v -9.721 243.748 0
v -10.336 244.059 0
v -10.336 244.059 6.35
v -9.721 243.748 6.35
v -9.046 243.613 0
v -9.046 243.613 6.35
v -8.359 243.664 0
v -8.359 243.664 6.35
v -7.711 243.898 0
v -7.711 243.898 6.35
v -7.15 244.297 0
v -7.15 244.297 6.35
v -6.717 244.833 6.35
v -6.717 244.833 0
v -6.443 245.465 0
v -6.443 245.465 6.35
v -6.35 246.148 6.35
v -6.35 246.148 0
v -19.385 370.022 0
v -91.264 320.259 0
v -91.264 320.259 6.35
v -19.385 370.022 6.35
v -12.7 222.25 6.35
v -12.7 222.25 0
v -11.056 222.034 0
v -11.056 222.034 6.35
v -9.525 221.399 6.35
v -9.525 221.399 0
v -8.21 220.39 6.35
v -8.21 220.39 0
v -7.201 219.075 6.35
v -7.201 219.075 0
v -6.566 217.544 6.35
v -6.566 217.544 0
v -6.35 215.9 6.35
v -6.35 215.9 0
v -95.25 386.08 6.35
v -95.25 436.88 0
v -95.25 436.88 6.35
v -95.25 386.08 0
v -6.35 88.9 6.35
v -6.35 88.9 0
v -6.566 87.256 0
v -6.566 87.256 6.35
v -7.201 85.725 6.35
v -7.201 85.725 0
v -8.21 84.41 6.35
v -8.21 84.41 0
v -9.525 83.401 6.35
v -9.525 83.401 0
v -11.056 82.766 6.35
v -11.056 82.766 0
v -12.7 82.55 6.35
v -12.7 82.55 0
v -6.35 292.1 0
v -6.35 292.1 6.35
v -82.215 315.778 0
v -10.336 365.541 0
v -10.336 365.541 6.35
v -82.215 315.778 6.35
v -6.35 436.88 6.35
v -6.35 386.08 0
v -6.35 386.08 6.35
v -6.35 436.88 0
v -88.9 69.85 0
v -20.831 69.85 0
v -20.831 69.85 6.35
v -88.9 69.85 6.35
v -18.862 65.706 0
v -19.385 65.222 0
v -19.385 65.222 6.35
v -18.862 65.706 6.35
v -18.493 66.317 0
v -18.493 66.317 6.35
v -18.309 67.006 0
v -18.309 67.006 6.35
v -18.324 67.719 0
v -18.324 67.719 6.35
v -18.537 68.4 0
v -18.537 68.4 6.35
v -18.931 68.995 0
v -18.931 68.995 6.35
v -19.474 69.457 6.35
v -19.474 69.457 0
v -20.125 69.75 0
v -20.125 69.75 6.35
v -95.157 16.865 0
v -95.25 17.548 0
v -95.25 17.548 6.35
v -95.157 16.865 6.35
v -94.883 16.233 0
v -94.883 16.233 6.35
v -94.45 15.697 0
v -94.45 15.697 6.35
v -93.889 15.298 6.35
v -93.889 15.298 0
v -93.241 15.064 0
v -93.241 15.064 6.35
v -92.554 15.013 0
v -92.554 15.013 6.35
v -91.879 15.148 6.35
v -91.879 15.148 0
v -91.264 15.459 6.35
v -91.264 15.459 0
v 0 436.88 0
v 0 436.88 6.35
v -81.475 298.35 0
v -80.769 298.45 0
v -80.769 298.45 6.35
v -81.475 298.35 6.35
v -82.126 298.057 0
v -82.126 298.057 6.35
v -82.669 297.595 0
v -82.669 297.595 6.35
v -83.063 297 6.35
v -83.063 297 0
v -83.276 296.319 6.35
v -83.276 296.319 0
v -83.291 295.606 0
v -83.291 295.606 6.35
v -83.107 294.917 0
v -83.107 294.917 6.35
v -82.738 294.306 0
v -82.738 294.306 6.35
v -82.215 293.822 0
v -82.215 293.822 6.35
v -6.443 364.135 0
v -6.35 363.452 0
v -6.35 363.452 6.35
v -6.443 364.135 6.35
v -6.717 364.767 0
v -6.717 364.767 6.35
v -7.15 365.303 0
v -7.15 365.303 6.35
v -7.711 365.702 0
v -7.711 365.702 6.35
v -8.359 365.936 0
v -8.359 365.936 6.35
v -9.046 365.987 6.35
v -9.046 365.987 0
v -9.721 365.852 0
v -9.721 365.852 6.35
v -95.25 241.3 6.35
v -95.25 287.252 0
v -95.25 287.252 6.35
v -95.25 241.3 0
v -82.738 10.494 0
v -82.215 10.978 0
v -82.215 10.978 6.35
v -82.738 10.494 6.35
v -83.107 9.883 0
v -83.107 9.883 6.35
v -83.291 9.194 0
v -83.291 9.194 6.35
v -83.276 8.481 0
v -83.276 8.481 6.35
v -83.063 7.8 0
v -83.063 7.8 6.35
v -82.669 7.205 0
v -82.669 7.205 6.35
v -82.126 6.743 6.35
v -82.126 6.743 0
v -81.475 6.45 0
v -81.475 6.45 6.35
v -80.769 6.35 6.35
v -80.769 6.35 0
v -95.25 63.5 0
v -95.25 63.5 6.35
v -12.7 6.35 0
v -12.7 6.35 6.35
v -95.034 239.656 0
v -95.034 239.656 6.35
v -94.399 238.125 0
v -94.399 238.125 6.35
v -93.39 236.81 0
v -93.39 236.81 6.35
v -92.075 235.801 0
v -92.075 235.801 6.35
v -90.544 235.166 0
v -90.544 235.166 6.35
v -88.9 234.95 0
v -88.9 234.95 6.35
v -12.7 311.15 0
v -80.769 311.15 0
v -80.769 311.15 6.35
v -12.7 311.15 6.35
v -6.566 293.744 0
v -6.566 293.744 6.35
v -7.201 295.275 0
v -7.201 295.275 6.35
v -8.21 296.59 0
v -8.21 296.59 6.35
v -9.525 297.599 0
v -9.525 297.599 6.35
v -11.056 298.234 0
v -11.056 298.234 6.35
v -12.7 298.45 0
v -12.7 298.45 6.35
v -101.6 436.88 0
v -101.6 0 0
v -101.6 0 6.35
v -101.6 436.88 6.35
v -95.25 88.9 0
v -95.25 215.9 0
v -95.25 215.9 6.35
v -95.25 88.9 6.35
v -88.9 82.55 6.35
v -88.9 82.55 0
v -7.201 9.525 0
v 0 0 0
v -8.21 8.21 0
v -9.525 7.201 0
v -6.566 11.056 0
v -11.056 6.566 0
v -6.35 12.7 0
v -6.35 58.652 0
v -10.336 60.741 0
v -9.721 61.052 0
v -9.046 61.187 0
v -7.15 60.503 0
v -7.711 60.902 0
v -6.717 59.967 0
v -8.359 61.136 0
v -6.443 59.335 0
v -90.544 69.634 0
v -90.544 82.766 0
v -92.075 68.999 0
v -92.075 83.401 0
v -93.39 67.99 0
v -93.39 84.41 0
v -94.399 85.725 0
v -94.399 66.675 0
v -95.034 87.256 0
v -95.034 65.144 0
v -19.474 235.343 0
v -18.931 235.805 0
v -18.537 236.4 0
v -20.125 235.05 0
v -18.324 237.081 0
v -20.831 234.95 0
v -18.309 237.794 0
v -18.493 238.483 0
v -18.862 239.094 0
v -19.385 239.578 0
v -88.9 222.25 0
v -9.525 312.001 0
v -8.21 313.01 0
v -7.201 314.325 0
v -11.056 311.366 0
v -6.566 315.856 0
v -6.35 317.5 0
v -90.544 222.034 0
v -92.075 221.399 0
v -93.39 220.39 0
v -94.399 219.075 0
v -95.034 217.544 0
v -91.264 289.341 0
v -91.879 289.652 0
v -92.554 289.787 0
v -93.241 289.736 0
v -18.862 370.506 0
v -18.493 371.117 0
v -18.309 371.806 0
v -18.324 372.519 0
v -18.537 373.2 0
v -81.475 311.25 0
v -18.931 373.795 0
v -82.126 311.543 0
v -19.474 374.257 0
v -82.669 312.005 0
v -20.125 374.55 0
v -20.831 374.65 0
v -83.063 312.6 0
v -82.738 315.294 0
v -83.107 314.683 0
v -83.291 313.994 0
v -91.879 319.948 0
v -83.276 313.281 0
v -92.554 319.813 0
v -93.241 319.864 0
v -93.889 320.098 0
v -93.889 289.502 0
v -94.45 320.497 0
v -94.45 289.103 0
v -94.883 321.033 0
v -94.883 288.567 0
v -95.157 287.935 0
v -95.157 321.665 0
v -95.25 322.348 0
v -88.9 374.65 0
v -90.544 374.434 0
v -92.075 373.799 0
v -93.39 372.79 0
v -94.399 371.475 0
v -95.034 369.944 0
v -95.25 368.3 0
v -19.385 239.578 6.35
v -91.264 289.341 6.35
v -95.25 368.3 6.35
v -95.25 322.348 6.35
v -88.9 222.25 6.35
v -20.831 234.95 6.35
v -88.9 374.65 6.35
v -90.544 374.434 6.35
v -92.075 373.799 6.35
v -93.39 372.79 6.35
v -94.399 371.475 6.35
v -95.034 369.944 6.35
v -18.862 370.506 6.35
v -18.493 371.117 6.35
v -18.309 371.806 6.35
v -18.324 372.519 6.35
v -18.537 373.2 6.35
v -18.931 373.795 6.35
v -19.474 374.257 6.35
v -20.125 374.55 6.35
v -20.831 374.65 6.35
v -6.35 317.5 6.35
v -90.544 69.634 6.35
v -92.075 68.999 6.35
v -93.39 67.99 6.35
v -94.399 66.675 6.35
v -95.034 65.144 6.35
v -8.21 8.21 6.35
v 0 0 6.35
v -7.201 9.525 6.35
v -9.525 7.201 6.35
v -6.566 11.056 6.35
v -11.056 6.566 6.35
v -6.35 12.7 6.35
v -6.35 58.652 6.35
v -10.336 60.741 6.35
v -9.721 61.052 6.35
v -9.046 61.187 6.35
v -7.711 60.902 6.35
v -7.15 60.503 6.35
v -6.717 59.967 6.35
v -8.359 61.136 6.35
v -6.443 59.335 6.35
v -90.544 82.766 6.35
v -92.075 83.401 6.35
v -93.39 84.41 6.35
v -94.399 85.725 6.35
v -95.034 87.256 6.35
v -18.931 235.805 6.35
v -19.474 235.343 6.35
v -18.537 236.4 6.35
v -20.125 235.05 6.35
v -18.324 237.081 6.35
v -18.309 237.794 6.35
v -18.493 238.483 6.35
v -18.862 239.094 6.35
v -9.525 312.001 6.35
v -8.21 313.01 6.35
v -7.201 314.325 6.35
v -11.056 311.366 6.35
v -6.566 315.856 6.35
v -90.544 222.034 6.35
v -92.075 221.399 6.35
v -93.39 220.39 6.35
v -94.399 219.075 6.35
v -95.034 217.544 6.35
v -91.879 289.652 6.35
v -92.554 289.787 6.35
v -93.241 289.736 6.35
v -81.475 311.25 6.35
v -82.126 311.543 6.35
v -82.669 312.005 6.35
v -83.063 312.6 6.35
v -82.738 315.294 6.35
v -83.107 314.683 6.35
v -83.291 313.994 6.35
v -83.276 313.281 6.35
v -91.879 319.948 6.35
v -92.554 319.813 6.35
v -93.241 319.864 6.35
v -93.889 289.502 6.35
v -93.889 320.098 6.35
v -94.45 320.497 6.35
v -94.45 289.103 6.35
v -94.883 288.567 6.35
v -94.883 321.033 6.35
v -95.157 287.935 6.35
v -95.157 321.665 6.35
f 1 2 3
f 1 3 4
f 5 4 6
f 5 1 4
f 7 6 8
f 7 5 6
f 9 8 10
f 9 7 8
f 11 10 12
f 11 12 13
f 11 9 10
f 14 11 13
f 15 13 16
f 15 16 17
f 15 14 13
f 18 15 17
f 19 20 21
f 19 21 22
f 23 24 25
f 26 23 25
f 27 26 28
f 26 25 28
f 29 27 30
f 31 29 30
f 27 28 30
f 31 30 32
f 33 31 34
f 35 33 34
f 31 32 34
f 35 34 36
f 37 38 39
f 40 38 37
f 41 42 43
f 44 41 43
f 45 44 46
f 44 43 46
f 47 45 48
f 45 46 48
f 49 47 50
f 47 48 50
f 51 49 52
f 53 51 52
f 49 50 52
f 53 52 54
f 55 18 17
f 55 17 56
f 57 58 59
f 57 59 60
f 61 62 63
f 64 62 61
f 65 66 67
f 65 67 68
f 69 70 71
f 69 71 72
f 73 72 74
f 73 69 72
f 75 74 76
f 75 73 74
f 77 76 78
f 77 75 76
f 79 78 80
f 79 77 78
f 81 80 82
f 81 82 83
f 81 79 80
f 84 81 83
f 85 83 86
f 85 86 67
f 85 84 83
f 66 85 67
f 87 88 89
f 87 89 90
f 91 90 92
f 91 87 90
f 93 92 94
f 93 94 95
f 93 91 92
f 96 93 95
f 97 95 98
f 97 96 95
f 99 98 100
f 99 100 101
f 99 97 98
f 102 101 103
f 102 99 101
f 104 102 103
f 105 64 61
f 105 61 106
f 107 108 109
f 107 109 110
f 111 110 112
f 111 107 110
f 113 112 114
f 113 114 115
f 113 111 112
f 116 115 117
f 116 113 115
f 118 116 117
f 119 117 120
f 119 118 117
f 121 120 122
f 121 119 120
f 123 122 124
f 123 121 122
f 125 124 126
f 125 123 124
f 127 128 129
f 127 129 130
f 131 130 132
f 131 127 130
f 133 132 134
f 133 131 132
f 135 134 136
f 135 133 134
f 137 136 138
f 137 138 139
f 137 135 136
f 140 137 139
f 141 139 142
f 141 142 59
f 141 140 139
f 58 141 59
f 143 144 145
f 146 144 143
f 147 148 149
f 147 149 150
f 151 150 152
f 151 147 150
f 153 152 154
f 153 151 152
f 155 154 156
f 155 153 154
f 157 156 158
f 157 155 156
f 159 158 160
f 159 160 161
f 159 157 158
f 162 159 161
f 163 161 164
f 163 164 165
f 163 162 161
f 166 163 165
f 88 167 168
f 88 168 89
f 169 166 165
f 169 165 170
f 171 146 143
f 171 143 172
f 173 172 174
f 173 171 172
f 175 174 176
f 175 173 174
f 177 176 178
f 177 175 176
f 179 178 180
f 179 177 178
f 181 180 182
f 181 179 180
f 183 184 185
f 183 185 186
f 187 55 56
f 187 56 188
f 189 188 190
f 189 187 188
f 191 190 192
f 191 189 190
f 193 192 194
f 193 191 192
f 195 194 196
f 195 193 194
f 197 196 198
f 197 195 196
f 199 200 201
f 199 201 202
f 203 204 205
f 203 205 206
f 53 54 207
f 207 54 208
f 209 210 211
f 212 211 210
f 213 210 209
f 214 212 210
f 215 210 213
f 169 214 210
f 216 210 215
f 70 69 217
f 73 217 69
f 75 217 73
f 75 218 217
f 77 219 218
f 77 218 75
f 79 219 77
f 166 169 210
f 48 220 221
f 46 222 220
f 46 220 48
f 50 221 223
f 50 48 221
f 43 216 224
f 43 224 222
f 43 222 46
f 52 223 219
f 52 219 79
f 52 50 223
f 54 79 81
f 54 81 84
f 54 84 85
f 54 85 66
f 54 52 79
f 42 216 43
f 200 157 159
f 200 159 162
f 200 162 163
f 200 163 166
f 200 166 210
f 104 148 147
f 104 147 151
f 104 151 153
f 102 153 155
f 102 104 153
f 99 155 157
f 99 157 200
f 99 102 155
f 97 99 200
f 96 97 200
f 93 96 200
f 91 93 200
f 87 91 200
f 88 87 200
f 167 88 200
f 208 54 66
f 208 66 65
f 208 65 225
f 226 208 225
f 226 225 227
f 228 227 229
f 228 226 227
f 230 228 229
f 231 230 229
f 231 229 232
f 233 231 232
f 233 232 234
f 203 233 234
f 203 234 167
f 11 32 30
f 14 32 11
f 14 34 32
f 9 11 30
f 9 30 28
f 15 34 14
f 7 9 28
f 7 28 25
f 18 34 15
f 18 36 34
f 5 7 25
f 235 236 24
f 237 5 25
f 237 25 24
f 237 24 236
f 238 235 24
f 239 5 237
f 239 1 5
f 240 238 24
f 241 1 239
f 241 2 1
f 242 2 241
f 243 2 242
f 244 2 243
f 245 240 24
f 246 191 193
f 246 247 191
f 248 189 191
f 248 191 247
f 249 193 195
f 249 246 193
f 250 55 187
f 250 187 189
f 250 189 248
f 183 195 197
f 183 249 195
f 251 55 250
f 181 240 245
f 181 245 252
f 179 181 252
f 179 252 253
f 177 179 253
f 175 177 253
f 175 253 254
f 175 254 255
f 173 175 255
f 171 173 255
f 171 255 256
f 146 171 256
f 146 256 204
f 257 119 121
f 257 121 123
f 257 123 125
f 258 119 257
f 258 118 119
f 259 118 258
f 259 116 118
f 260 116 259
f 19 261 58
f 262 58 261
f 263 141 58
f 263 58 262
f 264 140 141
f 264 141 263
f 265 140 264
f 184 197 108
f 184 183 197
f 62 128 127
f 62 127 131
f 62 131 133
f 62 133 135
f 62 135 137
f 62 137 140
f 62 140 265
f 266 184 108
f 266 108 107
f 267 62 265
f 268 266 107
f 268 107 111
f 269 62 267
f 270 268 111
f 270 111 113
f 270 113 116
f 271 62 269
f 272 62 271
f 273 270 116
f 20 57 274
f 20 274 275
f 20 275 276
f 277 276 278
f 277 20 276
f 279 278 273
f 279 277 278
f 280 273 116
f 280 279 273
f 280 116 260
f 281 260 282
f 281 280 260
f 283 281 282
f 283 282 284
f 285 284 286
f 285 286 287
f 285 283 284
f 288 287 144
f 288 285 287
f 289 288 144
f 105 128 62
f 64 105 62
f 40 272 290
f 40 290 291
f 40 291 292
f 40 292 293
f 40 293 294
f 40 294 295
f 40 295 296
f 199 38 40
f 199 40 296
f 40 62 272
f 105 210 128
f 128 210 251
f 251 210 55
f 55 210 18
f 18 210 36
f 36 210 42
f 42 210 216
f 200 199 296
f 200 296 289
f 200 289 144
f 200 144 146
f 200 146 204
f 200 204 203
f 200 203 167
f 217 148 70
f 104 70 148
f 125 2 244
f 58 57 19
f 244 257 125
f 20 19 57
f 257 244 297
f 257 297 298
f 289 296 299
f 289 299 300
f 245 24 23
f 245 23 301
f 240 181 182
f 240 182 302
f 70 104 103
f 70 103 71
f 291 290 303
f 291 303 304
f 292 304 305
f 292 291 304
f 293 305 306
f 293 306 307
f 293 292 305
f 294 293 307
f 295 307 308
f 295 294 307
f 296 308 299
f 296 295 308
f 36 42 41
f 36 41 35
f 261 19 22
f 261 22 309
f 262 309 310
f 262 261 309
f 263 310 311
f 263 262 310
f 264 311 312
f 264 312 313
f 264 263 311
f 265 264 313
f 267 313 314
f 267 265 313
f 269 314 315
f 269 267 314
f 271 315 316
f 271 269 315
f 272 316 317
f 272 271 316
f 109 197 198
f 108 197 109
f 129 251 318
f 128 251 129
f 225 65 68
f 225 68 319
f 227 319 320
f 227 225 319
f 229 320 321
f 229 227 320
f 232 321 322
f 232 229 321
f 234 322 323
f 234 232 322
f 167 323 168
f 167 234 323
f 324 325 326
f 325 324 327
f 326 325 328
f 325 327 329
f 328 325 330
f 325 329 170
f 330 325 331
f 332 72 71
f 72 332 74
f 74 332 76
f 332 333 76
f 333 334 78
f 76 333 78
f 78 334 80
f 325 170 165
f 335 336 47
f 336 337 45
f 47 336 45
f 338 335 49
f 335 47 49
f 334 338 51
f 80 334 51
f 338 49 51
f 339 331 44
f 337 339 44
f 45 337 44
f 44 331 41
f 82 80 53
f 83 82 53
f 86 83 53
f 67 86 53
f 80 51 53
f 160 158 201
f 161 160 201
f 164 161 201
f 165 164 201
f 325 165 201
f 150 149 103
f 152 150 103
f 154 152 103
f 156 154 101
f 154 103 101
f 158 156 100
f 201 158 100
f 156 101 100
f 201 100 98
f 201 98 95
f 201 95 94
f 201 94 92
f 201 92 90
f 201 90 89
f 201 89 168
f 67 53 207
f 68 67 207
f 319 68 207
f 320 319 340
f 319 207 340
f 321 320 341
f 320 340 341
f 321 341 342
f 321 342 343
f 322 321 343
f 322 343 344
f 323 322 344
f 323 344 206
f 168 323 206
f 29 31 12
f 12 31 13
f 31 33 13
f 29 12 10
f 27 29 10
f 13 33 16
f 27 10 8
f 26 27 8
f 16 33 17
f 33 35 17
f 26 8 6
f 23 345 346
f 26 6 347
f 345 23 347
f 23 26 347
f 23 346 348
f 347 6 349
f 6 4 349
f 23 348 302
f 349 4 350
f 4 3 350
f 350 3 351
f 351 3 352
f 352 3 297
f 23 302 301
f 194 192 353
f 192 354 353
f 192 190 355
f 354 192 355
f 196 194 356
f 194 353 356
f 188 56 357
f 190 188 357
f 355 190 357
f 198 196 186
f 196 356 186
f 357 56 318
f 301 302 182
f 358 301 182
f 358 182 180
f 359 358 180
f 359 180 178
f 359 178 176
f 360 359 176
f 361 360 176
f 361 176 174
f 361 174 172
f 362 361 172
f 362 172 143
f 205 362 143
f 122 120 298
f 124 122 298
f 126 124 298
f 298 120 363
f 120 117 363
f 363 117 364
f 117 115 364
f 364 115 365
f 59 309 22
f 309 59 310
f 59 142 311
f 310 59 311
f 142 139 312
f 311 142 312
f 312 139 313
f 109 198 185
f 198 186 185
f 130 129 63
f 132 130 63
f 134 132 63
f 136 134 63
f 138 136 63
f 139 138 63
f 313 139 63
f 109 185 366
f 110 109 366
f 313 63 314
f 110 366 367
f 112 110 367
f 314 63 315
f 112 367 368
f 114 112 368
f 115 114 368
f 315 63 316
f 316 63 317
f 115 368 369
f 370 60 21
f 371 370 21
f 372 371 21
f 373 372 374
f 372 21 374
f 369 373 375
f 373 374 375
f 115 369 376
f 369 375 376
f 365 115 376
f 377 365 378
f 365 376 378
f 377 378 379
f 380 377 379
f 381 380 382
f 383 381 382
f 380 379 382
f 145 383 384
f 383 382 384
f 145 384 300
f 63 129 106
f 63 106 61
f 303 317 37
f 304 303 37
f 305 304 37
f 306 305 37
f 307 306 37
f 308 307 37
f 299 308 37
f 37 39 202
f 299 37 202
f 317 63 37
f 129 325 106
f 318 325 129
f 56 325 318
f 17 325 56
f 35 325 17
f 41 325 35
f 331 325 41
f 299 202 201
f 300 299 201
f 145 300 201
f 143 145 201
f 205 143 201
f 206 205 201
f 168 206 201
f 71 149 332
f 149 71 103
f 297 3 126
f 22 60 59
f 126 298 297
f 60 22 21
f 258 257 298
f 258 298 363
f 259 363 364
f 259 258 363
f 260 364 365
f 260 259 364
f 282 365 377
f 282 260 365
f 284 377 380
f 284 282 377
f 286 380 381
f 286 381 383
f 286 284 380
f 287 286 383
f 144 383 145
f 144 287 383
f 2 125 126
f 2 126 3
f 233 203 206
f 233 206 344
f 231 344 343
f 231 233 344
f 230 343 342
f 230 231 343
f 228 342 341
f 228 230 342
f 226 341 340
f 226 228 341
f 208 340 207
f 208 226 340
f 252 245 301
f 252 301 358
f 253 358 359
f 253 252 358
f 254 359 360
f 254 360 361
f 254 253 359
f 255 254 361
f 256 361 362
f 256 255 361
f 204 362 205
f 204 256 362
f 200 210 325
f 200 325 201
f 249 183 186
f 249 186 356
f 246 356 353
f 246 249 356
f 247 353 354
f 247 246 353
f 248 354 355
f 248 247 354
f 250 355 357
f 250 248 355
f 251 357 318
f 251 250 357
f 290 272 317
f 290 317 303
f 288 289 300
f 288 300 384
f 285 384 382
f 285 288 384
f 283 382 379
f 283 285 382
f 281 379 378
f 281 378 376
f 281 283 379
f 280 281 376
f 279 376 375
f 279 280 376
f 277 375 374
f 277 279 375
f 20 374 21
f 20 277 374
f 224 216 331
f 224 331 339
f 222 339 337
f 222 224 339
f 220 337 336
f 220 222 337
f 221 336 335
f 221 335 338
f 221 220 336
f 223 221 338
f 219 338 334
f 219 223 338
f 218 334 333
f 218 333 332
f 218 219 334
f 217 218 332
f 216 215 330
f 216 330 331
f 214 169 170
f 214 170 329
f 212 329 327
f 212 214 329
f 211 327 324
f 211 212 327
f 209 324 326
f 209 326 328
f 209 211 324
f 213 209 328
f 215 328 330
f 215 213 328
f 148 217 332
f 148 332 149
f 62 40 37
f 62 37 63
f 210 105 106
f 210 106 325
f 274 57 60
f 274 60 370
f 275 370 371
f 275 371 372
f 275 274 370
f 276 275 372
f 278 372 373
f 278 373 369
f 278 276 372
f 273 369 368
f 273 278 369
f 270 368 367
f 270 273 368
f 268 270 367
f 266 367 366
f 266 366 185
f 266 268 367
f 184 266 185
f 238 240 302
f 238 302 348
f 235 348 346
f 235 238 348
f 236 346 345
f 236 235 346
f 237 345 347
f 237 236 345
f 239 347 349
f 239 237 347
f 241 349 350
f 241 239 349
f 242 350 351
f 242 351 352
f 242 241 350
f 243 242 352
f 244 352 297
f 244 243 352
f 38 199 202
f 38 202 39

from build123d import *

# Parameters (mm, degrees)
BOSS_EXTRUDE1_DEPTH = 6.35
CUT_EXTRUDE1_START  = -6.35
CUT_EXTRUDE1_DEPTH  = 6.35


with BuildPart() as part:
    # Model → Boss-Extrude1 (new body)
    with BuildSketch(Plane.XY):
        Polygon((-95.25, 386.08), (-6.35, 386.08), (-6.35, 436.88), (0, 436.88), (0, 0), (-101.6, 0), (-101.6, 436.88), (-95.25, 436.88), align=None)
        with BuildLine():
            Line((-80.76878597, 311.15), (-12.7, 311.15))
            ThreePointArc((-12.7, 311.15), (-8.209871939, 313.009871939), (-6.35, 317.5))
            Line((-6.35, 317.5), (-6.35, 363.45223644))
            ThreePointArc((-6.35, 363.45223644), (-7.711169032, 365.702115893), (-10.335793346, 365.540604607))
            Line((-10.335793346, 365.540604607), (-82.214579316, 315.778368167))
            ThreePointArc((-82.214579316, 315.778368167), (-83.193250358, 312.932654354), (-80.76878597, 311.15))
        make_face(mode=Mode.SUBTRACT)
        with BuildLine():
            Line((-95.25, 287.25223644), (-95.25, 241.3))
            ThreePointArc((-95.25, 241.3), (-93.390128061, 236.809871939), (-88.9, 234.95))
            Line((-88.9, 234.95), (-20.83121403, 234.95))
            ThreePointArc((-20.83121403, 234.95), (-18.406749642, 236.732654354), (-19.385420684, 239.578368167))
            Line((-19.385420684, 239.578368167), (-91.264206654, 289.340604607))
            ThreePointArc((-91.264206654, 289.340604607), (-93.888830968, 289.502115893), (-95.25, 287.25223644))
        make_face(mode=Mode.SUBTRACT)
        with BuildLine():
            Line((-80.76878597, 158.75), (-12.7, 158.75))
            ThreePointArc((-12.7, 158.75), (-8.209871939, 160.609871939), (-6.35, 165.1))
            Line((-6.35, 165.1), (-6.35, 211.05223644))
            ThreePointArc((-6.35, 211.05223644), (-7.711169032, 213.302115893), (-10.335793346, 213.140604607))
            Line((-10.335793346, 213.140604607), (-82.214579316, 163.378368167))
            ThreePointArc((-82.214579316, 163.378368167), (-83.193250358, 160.532654354), (-80.76878597, 158.75))
        make_face(mode=Mode.SUBTRACT)
        with BuildLine():
            Line((-20.83121403, 222.25), (-88.9, 222.25))
            ThreePointArc((-88.9, 222.25), (-93.390128061, 220.390128061), (-95.25, 215.9))
            Line((-95.25, 215.9), (-95.25, 169.94776356))
            ThreePointArc((-95.25, 169.94776356), (-93.888830968, 167.697884107), (-91.264206654, 167.859395393))
            Line((-91.264206654, 167.859395393), (-19.385420684, 217.621631833))
            ThreePointArc((-19.385420684, 217.621631833), (-18.406749642, 220.467345646), (-20.83121403, 222.25))
        make_face(mode=Mode.SUBTRACT)
        with BuildLine():
            Line((-82.214579316, 293.821631833), (-10.335793346, 244.059395393))
            ThreePointArc((-10.335793346, 244.059395393), (-7.711169032, 243.897884107), (-6.35, 246.14776356))
            Line((-6.35, 246.14776356), (-6.35, 292.1))
            ThreePointArc((-6.35, 292.1), (-8.209871939, 296.590128061), (-12.7, 298.45))
            Line((-12.7, 298.45), (-80.76878597, 298.45))
            ThreePointArc((-80.76878597, 298.45), (-83.193250358, 296.667345646), (-82.214579316, 293.821631833))
        make_face(mode=Mode.SUBTRACT)
        with BuildLine():
            Line((-95.25, 134.85223644), (-95.25, 88.9))
            ThreePointArc((-95.25, 88.9), (-93.390128061, 84.409871939), (-88.9, 82.55))
            Line((-88.9, 82.55), (-20.83121403, 82.55))
            ThreePointArc((-20.83121403, 82.55), (-18.406749642, 84.332654354), (-19.385420684, 87.178368167))
            Line((-19.385420684, 87.178368167), (-91.264206654, 136.940604607))
            ThreePointArc((-91.264206654, 136.940604607), (-93.888830968, 137.102115893), (-95.25, 134.85223644))
        make_face(mode=Mode.SUBTRACT)
        with BuildLine():
            Line((-80.76878597, 6.35), (-12.7, 6.35))
            ThreePointArc((-12.7, 6.35), (-8.209871939, 8.209871939), (-6.35, 12.7))
            Line((-6.35, 12.7), (-6.35, 58.65223644))
            ThreePointArc((-6.35, 58.65223644), (-7.711169032, 60.902115893), (-10.335793346, 60.740604607))
            Line((-10.335793346, 60.740604607), (-82.214579316, 10.978368167))
            ThreePointArc((-82.214579316, 10.978368167), (-83.193250358, 8.132654354), (-80.76878597, 6.35))
        make_face(mode=Mode.SUBTRACT)
        with BuildLine():
            Line((-20.83121403, 69.85), (-88.9, 69.85))
            ThreePointArc((-88.9, 69.85), (-93.390128061, 67.990128061), (-95.25, 63.5))
            Line((-95.25, 63.5), (-95.25, 17.54776356))
            ThreePointArc((-95.25, 17.54776356), (-93.888830968, 15.297884107), (-91.264206654, 15.459395393))
            Line((-91.264206654, 15.459395393), (-19.385420684, 65.221631833))
            ThreePointArc((-19.385420684, 65.221631833), (-18.406749642, 68.067345646), (-20.83121403, 69.85))
        make_face(mode=Mode.SUBTRACT)
        with BuildLine():
            Line((-20.83121403, 374.65), (-88.9, 374.65))
            ThreePointArc((-88.9, 374.65), (-93.390128061, 372.790128061), (-95.25, 368.3))
            Line((-95.25, 368.3), (-95.25, 322.34776356))
            ThreePointArc((-95.25, 322.34776356), (-93.888830968, 320.097884107), (-91.264206654, 320.259395393))
            Line((-91.264206654, 320.259395393), (-19.385420684, 370.021631833))
            ThreePointArc((-19.385420684, 370.021631833), (-18.406749642, 372.867345646), (-20.83121403, 374.65))
        make_face(mode=Mode.SUBTRACT)
        with BuildLine():
            Line((-82.214579316, 141.421631833), (-10.335793346, 91.659395393))
            ThreePointArc((-10.335793346, 91.659395393), (-7.711169032, 91.497884107), (-6.35, 93.74776356))
            Line((-6.35, 93.74776356), (-6.35, 139.7))
            ThreePointArc((-6.35, 139.7), (-8.209871939, 144.190128061), (-12.7, 146.05))
            Line((-12.7, 146.05), (-80.76878597, 146.05))
            ThreePointArc((-80.76878597, 146.05), (-83.193250358, 144.267345646), (-82.214579316, 141.421631833))
        make_face(mode=Mode.SUBTRACT)
    extrude(amount=BOSS_EXTRUDE1_DEPTH)

    # Sketch1 → Cut-Extrude1 (cut)
    with BuildSketch(Plane.XY.offset(6.35).offset(CUT_EXTRUDE1_START)):
        with BuildLine():
            Line((-12.7, 82.55), (-88.9, 82.55))
            ThreePointArc((-88.9, 82.55), (-93.390128061, 84.409871939), (-95.25, 88.9))
            Line((-95.25, 88.9), (-95.25, 215.9))
            ThreePointArc((-95.25, 215.9), (-93.390128061, 220.390128061), (-88.9, 222.25))
            Line((-88.9, 222.25), (-12.7, 222.25))
            ThreePointArc((-12.7, 222.25), (-8.209871939, 220.390128061), (-6.35, 215.9))
            Line((-6.35, 215.9), (-6.35, 88.9))
            ThreePointArc((-6.35, 88.9), (-8.209871939, 84.409871939), (-12.7, 82.55))
        make_face()
    extrude(amount=CUT_EXTRUDE1_DEPTH, mode=Mode.SUBTRACT)


solid = part.part
